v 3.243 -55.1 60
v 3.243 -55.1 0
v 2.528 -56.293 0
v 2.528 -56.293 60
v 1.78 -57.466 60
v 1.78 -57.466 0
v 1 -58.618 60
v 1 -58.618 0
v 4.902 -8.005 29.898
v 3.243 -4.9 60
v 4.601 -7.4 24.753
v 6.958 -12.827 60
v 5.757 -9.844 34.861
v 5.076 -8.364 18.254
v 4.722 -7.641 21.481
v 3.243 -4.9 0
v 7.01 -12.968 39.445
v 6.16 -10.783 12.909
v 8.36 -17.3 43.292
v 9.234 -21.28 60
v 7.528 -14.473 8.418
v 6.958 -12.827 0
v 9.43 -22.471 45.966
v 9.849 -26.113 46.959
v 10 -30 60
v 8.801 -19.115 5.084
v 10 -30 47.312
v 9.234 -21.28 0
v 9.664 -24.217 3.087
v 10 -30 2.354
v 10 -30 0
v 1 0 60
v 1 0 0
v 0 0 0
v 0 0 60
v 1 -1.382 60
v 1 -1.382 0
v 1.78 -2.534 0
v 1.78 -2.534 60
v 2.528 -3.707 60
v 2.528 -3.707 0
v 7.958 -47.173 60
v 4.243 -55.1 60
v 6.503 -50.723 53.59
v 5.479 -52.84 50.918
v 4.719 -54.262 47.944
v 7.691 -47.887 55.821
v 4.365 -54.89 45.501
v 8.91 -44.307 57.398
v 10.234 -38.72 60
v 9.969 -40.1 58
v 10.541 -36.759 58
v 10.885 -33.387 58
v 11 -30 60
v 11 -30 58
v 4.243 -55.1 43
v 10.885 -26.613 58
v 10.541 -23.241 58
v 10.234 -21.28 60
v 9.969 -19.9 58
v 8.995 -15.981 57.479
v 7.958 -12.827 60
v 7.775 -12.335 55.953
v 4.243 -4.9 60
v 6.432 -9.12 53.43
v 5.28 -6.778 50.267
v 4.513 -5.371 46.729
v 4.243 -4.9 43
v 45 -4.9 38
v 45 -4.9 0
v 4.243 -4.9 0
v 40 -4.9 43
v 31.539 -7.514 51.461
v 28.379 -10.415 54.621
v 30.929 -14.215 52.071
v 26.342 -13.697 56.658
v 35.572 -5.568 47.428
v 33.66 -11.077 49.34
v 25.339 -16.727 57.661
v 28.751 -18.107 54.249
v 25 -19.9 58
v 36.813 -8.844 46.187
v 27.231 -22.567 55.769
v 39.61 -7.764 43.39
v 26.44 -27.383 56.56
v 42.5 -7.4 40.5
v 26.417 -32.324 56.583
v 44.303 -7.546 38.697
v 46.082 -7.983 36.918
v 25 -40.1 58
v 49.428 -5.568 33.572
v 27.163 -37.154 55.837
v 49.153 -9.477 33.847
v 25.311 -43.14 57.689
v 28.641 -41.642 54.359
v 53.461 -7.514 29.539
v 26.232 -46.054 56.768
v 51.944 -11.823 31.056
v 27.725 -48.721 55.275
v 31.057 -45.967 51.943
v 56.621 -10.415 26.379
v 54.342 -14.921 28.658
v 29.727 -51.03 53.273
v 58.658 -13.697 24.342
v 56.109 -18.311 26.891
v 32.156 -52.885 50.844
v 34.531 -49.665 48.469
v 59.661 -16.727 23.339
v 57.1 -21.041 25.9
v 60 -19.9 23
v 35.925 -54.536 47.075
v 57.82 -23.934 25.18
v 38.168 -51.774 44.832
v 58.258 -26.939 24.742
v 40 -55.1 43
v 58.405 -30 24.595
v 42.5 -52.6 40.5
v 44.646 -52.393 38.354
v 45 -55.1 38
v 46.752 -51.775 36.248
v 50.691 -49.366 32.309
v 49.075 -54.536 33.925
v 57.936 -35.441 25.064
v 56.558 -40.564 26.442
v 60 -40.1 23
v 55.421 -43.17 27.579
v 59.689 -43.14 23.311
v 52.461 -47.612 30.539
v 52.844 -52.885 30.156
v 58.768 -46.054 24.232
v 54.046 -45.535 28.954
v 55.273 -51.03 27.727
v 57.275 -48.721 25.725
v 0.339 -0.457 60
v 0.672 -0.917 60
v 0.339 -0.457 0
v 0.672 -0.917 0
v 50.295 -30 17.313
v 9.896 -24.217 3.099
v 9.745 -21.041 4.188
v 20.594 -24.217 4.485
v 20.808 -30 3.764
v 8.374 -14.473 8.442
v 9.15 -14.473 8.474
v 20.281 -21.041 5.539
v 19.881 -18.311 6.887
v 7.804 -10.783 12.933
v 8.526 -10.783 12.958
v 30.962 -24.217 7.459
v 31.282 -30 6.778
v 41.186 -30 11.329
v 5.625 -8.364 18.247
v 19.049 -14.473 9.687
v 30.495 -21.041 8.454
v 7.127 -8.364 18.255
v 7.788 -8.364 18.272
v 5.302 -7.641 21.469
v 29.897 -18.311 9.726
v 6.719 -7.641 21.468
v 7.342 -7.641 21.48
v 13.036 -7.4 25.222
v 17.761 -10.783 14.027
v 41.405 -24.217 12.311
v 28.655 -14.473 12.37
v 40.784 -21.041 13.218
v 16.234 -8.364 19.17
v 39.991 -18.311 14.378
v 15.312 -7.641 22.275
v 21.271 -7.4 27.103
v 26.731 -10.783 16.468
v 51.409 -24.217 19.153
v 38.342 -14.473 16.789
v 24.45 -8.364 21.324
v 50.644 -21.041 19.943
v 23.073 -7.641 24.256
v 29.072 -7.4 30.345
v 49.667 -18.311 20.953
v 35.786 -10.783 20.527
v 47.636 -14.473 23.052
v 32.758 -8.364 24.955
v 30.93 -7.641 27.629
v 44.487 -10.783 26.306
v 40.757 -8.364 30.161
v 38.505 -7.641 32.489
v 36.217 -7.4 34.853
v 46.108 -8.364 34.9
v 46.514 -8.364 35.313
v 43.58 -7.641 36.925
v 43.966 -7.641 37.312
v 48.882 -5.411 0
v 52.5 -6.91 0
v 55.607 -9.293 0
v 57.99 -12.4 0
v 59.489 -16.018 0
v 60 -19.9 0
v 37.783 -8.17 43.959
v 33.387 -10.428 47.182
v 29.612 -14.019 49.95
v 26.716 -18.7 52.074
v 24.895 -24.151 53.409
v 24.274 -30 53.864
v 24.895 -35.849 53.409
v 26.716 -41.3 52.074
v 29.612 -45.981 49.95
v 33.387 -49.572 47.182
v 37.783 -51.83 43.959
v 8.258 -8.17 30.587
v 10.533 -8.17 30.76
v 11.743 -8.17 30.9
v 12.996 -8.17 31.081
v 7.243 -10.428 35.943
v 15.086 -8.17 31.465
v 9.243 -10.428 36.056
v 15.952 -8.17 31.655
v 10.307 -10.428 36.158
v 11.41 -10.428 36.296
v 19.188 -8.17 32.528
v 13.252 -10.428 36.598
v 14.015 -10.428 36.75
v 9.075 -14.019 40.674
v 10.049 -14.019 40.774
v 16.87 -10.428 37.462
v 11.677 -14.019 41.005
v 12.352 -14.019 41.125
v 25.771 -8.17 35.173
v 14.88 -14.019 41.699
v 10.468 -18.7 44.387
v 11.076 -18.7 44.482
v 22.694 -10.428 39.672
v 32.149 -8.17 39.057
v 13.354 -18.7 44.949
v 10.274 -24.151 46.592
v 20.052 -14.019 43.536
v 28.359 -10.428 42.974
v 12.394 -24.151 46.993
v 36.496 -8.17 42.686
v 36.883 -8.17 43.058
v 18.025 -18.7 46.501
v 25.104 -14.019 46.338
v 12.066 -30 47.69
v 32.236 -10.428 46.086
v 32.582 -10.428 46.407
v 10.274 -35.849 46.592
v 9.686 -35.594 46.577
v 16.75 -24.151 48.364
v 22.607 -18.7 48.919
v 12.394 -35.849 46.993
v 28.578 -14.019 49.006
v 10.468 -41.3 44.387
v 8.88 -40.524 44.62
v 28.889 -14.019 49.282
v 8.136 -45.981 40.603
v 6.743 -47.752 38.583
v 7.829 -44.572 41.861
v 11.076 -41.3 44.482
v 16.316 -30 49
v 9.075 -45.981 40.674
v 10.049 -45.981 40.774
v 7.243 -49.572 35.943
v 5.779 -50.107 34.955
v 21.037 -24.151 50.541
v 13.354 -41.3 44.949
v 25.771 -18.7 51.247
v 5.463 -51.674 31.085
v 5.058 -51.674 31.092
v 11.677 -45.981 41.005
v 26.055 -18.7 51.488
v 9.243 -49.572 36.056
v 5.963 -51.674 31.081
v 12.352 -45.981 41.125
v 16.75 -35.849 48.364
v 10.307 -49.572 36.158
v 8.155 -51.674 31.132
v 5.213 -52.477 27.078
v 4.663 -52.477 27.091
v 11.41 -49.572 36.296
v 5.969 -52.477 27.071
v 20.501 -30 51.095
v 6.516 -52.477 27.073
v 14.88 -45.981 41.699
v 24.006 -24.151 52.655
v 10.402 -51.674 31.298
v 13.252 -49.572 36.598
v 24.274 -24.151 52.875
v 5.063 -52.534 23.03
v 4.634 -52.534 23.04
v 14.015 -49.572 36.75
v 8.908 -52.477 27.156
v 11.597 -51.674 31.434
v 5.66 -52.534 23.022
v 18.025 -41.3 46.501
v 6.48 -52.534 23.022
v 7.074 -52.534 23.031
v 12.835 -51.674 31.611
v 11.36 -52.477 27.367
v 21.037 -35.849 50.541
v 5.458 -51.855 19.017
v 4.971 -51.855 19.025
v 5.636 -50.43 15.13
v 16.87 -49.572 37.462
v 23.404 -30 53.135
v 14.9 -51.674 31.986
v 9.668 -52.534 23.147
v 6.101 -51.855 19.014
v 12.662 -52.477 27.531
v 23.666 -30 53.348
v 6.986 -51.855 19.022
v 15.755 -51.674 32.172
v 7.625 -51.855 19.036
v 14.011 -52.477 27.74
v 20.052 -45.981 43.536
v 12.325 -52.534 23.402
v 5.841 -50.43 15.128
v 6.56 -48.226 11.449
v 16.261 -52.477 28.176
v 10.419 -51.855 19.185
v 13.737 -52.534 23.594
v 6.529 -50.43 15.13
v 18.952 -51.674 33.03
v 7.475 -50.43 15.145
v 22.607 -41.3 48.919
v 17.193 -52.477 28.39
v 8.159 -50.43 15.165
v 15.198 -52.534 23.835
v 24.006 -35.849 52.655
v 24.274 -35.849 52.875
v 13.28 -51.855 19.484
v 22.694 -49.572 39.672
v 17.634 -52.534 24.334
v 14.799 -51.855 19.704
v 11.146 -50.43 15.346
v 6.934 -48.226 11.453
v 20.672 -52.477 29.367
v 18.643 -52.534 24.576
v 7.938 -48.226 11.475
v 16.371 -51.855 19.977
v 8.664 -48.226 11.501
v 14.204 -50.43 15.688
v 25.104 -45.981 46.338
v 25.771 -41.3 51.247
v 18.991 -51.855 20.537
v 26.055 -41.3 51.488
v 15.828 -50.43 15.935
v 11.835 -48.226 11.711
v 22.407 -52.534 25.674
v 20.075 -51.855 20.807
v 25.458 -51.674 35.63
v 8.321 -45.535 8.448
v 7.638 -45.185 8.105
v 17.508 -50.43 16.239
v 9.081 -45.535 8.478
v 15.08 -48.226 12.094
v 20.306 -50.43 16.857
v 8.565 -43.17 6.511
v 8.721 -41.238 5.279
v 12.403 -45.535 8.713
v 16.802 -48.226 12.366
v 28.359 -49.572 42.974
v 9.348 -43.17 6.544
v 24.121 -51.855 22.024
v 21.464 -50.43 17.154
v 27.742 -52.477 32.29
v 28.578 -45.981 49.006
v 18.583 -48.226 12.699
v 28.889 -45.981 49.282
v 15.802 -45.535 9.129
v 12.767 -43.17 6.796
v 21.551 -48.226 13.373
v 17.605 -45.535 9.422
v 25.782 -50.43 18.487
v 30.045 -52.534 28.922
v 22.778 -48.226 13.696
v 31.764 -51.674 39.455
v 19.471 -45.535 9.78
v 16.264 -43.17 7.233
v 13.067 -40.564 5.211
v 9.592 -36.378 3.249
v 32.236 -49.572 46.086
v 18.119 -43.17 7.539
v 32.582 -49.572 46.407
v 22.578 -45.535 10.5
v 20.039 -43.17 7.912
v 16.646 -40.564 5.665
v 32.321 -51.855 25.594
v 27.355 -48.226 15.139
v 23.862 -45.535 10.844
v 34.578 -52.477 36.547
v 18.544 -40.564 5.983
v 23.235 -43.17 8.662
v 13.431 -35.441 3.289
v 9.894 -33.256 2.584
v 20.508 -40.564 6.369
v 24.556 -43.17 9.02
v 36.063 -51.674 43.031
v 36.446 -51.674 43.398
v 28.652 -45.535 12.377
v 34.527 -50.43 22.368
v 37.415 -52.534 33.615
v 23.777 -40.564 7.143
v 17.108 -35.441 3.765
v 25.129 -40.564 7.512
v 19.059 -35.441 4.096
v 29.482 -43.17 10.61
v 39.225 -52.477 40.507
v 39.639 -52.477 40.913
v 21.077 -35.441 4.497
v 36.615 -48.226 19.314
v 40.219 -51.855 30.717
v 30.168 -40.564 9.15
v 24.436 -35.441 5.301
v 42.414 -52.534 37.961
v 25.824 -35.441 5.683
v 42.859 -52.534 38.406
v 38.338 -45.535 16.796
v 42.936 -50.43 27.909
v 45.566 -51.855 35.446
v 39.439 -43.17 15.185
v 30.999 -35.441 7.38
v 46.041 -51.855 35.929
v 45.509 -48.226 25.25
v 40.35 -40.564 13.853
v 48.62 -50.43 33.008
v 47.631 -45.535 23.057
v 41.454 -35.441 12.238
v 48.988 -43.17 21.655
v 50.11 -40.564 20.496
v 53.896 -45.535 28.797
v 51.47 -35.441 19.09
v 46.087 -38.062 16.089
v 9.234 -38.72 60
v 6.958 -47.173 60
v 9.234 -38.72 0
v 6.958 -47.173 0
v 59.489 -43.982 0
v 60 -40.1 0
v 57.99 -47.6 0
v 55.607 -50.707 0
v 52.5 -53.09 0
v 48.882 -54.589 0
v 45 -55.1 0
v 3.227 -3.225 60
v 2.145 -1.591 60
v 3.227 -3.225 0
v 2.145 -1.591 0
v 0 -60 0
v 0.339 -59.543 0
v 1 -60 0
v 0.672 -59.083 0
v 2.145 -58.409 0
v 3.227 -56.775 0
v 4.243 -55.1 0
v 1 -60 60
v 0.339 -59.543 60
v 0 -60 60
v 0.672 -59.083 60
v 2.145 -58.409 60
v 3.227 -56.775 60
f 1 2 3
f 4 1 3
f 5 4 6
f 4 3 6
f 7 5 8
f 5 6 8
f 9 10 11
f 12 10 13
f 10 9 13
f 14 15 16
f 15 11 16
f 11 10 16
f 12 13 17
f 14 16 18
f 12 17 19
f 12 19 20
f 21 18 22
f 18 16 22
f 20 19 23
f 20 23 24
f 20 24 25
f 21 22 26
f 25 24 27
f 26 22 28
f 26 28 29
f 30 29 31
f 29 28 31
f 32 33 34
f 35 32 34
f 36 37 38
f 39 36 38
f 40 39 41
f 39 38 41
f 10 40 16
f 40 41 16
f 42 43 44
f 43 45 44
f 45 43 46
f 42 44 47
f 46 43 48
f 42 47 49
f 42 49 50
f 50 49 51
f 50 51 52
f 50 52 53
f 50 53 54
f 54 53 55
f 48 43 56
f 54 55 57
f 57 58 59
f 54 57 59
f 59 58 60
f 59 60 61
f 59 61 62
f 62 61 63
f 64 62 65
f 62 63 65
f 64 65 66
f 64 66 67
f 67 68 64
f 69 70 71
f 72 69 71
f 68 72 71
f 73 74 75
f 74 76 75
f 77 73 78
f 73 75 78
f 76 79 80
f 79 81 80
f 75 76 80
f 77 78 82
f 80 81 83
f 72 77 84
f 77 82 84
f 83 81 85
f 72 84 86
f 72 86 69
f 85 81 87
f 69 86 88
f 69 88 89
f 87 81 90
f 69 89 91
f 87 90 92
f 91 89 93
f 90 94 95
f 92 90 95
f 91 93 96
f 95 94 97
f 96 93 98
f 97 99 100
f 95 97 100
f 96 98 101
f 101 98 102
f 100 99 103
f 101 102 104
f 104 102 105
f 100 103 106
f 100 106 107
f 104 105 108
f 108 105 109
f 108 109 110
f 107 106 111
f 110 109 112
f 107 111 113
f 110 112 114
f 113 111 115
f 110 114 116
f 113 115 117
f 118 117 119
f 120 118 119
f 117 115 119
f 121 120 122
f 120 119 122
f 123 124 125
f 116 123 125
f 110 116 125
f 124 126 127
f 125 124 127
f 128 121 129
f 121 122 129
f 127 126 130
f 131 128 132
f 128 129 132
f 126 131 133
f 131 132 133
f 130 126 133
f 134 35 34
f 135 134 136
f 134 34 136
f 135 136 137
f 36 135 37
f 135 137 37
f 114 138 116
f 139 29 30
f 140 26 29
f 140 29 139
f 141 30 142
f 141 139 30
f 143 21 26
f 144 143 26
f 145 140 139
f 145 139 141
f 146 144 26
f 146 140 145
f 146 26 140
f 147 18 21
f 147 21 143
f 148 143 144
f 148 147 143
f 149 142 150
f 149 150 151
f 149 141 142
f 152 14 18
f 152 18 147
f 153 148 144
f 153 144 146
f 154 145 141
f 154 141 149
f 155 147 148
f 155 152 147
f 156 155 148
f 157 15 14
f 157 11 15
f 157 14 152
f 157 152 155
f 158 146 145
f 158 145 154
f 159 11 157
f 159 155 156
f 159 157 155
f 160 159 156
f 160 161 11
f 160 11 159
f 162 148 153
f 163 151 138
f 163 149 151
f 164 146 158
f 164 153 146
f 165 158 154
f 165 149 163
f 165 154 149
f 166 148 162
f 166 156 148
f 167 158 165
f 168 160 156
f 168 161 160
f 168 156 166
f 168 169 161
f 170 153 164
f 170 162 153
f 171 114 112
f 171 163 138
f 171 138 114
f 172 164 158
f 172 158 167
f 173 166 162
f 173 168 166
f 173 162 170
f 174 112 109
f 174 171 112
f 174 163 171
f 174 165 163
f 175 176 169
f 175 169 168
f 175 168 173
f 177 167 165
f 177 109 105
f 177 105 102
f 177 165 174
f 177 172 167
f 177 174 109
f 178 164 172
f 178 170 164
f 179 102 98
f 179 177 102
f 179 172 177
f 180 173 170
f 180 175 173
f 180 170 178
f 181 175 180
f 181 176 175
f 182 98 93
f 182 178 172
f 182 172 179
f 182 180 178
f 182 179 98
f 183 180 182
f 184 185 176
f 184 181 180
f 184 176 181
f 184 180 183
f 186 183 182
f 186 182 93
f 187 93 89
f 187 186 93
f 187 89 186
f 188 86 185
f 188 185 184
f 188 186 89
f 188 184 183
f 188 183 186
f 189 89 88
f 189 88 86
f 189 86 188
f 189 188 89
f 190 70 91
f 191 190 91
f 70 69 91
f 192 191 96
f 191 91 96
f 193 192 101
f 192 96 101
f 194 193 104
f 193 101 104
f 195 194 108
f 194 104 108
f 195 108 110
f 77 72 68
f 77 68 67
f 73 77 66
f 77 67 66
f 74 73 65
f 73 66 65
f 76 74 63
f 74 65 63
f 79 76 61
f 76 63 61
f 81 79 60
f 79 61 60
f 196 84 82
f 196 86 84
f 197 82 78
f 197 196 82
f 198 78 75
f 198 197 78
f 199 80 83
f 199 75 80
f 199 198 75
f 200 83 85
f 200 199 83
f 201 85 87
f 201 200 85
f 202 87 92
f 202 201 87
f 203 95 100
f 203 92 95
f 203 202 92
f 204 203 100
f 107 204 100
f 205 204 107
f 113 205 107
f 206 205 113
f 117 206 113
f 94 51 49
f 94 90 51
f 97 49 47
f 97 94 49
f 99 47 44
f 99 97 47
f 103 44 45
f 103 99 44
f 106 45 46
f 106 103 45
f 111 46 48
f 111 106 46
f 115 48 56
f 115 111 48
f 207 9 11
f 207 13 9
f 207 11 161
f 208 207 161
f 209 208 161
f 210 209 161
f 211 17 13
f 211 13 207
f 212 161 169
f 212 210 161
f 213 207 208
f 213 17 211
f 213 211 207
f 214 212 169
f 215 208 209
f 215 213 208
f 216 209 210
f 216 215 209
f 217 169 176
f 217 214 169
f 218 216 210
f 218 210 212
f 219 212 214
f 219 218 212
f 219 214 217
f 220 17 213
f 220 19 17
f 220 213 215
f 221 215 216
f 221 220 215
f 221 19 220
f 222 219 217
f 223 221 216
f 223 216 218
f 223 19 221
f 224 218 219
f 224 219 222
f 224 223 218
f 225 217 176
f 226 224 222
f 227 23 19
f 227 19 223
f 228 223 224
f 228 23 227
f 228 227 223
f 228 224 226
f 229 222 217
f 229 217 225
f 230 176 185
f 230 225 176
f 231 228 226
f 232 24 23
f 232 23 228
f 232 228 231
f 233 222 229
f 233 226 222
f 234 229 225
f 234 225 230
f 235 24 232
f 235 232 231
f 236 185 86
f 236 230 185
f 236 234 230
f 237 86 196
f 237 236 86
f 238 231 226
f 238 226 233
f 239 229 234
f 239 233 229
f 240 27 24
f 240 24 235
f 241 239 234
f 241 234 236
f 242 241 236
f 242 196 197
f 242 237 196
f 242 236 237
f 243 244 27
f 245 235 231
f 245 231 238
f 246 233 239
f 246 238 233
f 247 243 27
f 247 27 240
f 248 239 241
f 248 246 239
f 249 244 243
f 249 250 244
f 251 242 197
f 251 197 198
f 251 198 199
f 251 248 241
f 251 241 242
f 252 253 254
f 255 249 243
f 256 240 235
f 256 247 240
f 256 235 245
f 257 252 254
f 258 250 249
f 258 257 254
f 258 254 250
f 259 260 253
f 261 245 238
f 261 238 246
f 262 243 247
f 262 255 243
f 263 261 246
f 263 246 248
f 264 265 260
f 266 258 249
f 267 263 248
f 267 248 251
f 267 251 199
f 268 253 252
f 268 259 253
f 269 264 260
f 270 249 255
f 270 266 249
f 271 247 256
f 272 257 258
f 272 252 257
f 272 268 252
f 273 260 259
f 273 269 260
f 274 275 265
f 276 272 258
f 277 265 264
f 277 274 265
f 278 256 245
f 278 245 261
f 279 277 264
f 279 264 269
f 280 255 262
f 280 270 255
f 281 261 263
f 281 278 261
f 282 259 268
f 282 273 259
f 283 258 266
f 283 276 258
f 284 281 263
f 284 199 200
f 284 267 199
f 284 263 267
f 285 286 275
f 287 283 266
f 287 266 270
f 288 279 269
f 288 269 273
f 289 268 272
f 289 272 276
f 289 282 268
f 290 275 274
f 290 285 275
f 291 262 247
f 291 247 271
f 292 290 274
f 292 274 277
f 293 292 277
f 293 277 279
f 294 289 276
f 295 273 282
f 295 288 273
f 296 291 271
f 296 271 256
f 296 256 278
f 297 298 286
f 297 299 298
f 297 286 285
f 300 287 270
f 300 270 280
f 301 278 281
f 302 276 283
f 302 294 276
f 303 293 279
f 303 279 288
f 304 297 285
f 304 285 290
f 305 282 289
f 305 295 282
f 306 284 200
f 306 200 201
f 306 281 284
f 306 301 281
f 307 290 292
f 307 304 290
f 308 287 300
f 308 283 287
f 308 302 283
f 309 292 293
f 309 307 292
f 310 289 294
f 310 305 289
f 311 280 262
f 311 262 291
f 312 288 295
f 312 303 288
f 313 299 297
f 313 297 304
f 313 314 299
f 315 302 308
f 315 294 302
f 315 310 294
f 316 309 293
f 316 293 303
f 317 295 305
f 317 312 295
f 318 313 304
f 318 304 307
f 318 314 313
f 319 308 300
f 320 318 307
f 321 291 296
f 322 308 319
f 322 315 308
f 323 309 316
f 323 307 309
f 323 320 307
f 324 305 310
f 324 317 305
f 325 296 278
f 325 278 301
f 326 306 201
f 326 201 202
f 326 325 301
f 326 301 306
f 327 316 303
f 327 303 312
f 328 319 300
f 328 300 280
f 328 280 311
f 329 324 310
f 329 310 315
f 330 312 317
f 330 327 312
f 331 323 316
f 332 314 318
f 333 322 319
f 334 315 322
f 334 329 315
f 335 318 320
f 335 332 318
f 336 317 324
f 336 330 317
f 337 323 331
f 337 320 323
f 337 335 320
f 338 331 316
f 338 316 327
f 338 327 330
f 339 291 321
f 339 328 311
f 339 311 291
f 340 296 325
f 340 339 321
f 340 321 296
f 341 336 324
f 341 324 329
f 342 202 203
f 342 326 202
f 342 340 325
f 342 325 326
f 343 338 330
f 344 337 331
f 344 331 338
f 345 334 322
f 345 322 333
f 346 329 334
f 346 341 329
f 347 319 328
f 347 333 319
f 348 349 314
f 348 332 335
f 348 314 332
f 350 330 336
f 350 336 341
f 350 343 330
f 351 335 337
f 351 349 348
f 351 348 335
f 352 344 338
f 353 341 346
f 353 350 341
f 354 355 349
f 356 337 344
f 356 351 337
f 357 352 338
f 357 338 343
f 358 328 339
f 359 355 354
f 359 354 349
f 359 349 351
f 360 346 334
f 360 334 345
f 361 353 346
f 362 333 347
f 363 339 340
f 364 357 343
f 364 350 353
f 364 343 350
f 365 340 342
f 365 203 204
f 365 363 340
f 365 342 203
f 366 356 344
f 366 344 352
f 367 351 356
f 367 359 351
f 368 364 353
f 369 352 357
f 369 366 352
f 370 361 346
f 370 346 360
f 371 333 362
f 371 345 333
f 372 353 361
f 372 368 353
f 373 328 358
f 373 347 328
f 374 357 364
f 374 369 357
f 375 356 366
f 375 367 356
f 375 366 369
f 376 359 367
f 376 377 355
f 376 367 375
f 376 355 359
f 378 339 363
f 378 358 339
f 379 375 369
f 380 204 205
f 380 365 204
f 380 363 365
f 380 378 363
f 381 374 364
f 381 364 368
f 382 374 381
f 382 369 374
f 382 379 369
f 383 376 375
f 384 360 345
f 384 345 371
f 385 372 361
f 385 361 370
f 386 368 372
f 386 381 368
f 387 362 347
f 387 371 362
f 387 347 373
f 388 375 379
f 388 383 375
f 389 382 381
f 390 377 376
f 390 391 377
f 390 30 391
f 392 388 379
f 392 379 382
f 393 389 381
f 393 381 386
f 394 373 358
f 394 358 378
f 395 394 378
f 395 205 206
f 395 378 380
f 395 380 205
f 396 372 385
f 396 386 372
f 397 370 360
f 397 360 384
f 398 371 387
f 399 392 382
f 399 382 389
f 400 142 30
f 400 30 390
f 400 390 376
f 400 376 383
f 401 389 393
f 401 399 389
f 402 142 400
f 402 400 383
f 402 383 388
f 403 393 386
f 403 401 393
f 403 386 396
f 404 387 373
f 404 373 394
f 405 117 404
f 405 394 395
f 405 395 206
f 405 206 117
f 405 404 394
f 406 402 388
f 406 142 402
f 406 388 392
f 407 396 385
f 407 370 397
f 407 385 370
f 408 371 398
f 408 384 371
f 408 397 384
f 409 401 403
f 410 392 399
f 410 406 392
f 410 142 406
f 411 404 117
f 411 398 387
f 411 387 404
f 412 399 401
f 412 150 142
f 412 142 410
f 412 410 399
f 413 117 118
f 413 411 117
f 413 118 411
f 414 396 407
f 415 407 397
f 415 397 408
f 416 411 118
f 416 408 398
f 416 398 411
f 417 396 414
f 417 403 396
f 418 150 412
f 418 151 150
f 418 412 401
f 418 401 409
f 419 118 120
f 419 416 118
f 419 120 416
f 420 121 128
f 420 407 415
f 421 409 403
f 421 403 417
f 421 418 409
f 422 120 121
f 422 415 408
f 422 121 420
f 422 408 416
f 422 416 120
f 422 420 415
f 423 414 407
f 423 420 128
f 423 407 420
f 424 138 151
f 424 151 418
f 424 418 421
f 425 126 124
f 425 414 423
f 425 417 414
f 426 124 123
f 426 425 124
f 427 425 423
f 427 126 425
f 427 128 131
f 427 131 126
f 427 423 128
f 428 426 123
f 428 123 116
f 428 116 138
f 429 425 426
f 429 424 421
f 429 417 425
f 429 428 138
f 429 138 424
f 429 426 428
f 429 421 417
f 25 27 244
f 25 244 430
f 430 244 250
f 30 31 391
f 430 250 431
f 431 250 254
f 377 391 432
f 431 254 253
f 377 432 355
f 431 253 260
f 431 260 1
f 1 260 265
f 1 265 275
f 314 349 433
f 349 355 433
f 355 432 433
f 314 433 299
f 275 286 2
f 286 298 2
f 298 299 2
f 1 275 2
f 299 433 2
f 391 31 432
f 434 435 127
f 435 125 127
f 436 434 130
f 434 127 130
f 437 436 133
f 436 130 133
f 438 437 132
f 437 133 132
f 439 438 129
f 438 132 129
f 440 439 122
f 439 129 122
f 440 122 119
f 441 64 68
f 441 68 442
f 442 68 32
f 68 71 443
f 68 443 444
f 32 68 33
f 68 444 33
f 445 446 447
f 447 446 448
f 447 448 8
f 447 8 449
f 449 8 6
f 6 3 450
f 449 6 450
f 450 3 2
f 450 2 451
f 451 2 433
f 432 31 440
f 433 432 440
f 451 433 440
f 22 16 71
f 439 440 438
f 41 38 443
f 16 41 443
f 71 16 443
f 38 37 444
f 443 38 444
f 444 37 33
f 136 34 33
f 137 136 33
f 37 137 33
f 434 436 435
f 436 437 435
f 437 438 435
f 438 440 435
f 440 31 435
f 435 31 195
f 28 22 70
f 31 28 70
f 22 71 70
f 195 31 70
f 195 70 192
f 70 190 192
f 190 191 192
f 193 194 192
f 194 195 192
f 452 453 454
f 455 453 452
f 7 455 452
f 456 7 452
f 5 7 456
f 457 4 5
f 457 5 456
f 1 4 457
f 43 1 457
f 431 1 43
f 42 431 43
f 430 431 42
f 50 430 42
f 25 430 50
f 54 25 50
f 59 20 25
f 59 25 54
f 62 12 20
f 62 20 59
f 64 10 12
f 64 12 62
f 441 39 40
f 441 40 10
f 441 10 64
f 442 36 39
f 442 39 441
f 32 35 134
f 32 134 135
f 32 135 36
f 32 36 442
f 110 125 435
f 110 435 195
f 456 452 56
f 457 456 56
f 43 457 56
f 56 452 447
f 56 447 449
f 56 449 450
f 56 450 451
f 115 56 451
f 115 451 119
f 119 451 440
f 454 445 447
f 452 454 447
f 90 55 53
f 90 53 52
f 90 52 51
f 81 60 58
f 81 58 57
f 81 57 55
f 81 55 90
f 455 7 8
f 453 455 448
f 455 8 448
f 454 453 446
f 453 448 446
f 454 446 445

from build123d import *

# Parameters (mm, degrees)
F1_DEPTH  = 60
F2_DEPTH  = 58
F5_DEPTH  = 60
F11_DEPTH = 25
F12_R     = 15


with BuildPart() as f1:
    # F0 (on Top) → F1 (new body)
    with BuildSketch(Plane.XY):
        with BuildLine():
            ThreePointArc((11, -30), (9.2813061641, -17.0032513647), (4.2433809964, -4.9))
            Line((4.2433809964, -4.9), (3.2433809964, -4.9))
            ThreePointArc((3.2433809964, -4.9), (8.2813061641, -17.0032513647), (10, -30))
            Line((10, -30), (11, -30))
        make_face()
        with BuildLine():
            Line((1, 0), (0, 0))
            ThreePointArc((0, 0), (0.5058928967, -0.6866474002), (1, -1.3818239575))
            Line((1, -1.3818239575), (1, 0))
        make_face()
        with BuildLine():
            ThreePointArc((4.2433809964, -55.1), (9.2813061641, -42.9967486353), (11, -30))
            Line((11, -30), (10, -30))
            ThreePointArc((10, -30), (8.2813061641, -42.9967486353), (3.2433809964, -55.1))
            Line((3.2433809964, -55.1), (4.2433809964, -55.1))
        make_face()
        with BuildLine():
            ThreePointArc((1, -60), (2.6937359795, -57.5976879479), (4.2433809964, -55.1))
            Line((4.2433809964, -55.1), (3.2433809964, -55.1))
            ThreePointArc((3.2433809964, -55.1), (2.1584060549, -56.8824998634), (1, -58.6181760425))
            Line((1, -58.6181760425), (1, -60))
        make_face()
        with BuildLine():
            ThreePointArc((1, -58.6181760425), (0.5058928967, -59.3133525998), (0, -60))
            Line((0, -60), (1, -60))
            Line((1, -60), (1, -58.6181760425))
        make_face()
        with BuildLine():
            ThreePointArc((4.2433809964, -4.9), (2.6937359795, -2.4023120521), (1, 0))
            Line((1, 0), (1, -1.3818239575))
            ThreePointArc((1, -1.3818239575), (2.1584060549, -3.1175001366), (3.2433809964, -4.9))
            Line((3.2433809964, -4.9), (4.2433809964, -4.9))
        make_face()
    extrude(amount=F1_DEPTH)

    # F0 (on Top) → F2 (join)
    with BuildSketch(Plane.XY):
        with BuildLine():
            Line((60, -4.9), (4.2433809964, -4.9))
            ThreePointArc((4.2433809964, -4.9), (9.2813061641, -17.0032513647), (11, -30))
            Line((11, -30), (60, -30))
            Line((60, -30), (60, -4.9))
        make_face()
        with BuildLine():
            Line((60, -30), (11, -30))
            ThreePointArc((11, -30), (9.2813061641, -42.9967486353), (4.2433809964, -55.1))
            Line((4.2433809964, -55.1), (60, -55.1))
            Line((60, -55.1), (60, -30))
        make_face()
    extrude(amount=F2_DEPTH)

    # F4 (on face) → F5 (cut)
    with BuildSketch(Plane.XZ.offset(55.1)):
        Polygon((60, 58), (25, 58), (60, 23), align=None)
    extrude(amount=-F5_DEPTH, mode=Mode.SUBTRACT)

    # F10: sweep along a path in F9
    with BuildLine(Plane.XZ.offset(30)) as f10_path:
        ThreePointArc((0, 25.1), (23.0896284171, 27.7230233964), (42.4998142724, 40.5001857276))
    # F7 (on Right) → F10 (sweep, cut)
    with BuildSketch(Plane.YZ):
        with BuildLine():
            Line((-30, 25.1), (-30, 2.5))
            ThreePointArc((-30, 2.5), (-14.0193867452, 9.1193867452), (-7.4, 25.1))
            Line((-7.4, 25.1), (-30, 25.1))
        make_face()
        with BuildLine():
            ThreePointArc((-7.4, 25.1), (-45.9806132548, 41.0806132548), (-30, 2.5))
            Line((-30, 2.5), (-30, 25.1))
            Line((-30, 25.1), (-7.4, 25.1))
        make_face()
    sweep(path=f10_path.line, mode=Mode.SUBTRACT)

    # F11 (cut): a face of the model
    f11_faces = [f1.faces().sort_by_distance(p)[0] for p in [
        (34.7646818914, -30, 46.1719723121),
    ]]
    extrude(f11_faces, amount=-F11_DEPTH, mode=Mode.SUBTRACT)

    # F12
    f12_edges = [f1.edges().sort_by_distance(p)[0] for p in [
        (14.62169, -55.1, 58),
        (14.62169, -4.9, 58),
        (60, -55.1, 11.5),
        (60, -4.9, 11.5),
    ]]
    fillet(f12_edges, radius=F12_R)


solid = f1.part
